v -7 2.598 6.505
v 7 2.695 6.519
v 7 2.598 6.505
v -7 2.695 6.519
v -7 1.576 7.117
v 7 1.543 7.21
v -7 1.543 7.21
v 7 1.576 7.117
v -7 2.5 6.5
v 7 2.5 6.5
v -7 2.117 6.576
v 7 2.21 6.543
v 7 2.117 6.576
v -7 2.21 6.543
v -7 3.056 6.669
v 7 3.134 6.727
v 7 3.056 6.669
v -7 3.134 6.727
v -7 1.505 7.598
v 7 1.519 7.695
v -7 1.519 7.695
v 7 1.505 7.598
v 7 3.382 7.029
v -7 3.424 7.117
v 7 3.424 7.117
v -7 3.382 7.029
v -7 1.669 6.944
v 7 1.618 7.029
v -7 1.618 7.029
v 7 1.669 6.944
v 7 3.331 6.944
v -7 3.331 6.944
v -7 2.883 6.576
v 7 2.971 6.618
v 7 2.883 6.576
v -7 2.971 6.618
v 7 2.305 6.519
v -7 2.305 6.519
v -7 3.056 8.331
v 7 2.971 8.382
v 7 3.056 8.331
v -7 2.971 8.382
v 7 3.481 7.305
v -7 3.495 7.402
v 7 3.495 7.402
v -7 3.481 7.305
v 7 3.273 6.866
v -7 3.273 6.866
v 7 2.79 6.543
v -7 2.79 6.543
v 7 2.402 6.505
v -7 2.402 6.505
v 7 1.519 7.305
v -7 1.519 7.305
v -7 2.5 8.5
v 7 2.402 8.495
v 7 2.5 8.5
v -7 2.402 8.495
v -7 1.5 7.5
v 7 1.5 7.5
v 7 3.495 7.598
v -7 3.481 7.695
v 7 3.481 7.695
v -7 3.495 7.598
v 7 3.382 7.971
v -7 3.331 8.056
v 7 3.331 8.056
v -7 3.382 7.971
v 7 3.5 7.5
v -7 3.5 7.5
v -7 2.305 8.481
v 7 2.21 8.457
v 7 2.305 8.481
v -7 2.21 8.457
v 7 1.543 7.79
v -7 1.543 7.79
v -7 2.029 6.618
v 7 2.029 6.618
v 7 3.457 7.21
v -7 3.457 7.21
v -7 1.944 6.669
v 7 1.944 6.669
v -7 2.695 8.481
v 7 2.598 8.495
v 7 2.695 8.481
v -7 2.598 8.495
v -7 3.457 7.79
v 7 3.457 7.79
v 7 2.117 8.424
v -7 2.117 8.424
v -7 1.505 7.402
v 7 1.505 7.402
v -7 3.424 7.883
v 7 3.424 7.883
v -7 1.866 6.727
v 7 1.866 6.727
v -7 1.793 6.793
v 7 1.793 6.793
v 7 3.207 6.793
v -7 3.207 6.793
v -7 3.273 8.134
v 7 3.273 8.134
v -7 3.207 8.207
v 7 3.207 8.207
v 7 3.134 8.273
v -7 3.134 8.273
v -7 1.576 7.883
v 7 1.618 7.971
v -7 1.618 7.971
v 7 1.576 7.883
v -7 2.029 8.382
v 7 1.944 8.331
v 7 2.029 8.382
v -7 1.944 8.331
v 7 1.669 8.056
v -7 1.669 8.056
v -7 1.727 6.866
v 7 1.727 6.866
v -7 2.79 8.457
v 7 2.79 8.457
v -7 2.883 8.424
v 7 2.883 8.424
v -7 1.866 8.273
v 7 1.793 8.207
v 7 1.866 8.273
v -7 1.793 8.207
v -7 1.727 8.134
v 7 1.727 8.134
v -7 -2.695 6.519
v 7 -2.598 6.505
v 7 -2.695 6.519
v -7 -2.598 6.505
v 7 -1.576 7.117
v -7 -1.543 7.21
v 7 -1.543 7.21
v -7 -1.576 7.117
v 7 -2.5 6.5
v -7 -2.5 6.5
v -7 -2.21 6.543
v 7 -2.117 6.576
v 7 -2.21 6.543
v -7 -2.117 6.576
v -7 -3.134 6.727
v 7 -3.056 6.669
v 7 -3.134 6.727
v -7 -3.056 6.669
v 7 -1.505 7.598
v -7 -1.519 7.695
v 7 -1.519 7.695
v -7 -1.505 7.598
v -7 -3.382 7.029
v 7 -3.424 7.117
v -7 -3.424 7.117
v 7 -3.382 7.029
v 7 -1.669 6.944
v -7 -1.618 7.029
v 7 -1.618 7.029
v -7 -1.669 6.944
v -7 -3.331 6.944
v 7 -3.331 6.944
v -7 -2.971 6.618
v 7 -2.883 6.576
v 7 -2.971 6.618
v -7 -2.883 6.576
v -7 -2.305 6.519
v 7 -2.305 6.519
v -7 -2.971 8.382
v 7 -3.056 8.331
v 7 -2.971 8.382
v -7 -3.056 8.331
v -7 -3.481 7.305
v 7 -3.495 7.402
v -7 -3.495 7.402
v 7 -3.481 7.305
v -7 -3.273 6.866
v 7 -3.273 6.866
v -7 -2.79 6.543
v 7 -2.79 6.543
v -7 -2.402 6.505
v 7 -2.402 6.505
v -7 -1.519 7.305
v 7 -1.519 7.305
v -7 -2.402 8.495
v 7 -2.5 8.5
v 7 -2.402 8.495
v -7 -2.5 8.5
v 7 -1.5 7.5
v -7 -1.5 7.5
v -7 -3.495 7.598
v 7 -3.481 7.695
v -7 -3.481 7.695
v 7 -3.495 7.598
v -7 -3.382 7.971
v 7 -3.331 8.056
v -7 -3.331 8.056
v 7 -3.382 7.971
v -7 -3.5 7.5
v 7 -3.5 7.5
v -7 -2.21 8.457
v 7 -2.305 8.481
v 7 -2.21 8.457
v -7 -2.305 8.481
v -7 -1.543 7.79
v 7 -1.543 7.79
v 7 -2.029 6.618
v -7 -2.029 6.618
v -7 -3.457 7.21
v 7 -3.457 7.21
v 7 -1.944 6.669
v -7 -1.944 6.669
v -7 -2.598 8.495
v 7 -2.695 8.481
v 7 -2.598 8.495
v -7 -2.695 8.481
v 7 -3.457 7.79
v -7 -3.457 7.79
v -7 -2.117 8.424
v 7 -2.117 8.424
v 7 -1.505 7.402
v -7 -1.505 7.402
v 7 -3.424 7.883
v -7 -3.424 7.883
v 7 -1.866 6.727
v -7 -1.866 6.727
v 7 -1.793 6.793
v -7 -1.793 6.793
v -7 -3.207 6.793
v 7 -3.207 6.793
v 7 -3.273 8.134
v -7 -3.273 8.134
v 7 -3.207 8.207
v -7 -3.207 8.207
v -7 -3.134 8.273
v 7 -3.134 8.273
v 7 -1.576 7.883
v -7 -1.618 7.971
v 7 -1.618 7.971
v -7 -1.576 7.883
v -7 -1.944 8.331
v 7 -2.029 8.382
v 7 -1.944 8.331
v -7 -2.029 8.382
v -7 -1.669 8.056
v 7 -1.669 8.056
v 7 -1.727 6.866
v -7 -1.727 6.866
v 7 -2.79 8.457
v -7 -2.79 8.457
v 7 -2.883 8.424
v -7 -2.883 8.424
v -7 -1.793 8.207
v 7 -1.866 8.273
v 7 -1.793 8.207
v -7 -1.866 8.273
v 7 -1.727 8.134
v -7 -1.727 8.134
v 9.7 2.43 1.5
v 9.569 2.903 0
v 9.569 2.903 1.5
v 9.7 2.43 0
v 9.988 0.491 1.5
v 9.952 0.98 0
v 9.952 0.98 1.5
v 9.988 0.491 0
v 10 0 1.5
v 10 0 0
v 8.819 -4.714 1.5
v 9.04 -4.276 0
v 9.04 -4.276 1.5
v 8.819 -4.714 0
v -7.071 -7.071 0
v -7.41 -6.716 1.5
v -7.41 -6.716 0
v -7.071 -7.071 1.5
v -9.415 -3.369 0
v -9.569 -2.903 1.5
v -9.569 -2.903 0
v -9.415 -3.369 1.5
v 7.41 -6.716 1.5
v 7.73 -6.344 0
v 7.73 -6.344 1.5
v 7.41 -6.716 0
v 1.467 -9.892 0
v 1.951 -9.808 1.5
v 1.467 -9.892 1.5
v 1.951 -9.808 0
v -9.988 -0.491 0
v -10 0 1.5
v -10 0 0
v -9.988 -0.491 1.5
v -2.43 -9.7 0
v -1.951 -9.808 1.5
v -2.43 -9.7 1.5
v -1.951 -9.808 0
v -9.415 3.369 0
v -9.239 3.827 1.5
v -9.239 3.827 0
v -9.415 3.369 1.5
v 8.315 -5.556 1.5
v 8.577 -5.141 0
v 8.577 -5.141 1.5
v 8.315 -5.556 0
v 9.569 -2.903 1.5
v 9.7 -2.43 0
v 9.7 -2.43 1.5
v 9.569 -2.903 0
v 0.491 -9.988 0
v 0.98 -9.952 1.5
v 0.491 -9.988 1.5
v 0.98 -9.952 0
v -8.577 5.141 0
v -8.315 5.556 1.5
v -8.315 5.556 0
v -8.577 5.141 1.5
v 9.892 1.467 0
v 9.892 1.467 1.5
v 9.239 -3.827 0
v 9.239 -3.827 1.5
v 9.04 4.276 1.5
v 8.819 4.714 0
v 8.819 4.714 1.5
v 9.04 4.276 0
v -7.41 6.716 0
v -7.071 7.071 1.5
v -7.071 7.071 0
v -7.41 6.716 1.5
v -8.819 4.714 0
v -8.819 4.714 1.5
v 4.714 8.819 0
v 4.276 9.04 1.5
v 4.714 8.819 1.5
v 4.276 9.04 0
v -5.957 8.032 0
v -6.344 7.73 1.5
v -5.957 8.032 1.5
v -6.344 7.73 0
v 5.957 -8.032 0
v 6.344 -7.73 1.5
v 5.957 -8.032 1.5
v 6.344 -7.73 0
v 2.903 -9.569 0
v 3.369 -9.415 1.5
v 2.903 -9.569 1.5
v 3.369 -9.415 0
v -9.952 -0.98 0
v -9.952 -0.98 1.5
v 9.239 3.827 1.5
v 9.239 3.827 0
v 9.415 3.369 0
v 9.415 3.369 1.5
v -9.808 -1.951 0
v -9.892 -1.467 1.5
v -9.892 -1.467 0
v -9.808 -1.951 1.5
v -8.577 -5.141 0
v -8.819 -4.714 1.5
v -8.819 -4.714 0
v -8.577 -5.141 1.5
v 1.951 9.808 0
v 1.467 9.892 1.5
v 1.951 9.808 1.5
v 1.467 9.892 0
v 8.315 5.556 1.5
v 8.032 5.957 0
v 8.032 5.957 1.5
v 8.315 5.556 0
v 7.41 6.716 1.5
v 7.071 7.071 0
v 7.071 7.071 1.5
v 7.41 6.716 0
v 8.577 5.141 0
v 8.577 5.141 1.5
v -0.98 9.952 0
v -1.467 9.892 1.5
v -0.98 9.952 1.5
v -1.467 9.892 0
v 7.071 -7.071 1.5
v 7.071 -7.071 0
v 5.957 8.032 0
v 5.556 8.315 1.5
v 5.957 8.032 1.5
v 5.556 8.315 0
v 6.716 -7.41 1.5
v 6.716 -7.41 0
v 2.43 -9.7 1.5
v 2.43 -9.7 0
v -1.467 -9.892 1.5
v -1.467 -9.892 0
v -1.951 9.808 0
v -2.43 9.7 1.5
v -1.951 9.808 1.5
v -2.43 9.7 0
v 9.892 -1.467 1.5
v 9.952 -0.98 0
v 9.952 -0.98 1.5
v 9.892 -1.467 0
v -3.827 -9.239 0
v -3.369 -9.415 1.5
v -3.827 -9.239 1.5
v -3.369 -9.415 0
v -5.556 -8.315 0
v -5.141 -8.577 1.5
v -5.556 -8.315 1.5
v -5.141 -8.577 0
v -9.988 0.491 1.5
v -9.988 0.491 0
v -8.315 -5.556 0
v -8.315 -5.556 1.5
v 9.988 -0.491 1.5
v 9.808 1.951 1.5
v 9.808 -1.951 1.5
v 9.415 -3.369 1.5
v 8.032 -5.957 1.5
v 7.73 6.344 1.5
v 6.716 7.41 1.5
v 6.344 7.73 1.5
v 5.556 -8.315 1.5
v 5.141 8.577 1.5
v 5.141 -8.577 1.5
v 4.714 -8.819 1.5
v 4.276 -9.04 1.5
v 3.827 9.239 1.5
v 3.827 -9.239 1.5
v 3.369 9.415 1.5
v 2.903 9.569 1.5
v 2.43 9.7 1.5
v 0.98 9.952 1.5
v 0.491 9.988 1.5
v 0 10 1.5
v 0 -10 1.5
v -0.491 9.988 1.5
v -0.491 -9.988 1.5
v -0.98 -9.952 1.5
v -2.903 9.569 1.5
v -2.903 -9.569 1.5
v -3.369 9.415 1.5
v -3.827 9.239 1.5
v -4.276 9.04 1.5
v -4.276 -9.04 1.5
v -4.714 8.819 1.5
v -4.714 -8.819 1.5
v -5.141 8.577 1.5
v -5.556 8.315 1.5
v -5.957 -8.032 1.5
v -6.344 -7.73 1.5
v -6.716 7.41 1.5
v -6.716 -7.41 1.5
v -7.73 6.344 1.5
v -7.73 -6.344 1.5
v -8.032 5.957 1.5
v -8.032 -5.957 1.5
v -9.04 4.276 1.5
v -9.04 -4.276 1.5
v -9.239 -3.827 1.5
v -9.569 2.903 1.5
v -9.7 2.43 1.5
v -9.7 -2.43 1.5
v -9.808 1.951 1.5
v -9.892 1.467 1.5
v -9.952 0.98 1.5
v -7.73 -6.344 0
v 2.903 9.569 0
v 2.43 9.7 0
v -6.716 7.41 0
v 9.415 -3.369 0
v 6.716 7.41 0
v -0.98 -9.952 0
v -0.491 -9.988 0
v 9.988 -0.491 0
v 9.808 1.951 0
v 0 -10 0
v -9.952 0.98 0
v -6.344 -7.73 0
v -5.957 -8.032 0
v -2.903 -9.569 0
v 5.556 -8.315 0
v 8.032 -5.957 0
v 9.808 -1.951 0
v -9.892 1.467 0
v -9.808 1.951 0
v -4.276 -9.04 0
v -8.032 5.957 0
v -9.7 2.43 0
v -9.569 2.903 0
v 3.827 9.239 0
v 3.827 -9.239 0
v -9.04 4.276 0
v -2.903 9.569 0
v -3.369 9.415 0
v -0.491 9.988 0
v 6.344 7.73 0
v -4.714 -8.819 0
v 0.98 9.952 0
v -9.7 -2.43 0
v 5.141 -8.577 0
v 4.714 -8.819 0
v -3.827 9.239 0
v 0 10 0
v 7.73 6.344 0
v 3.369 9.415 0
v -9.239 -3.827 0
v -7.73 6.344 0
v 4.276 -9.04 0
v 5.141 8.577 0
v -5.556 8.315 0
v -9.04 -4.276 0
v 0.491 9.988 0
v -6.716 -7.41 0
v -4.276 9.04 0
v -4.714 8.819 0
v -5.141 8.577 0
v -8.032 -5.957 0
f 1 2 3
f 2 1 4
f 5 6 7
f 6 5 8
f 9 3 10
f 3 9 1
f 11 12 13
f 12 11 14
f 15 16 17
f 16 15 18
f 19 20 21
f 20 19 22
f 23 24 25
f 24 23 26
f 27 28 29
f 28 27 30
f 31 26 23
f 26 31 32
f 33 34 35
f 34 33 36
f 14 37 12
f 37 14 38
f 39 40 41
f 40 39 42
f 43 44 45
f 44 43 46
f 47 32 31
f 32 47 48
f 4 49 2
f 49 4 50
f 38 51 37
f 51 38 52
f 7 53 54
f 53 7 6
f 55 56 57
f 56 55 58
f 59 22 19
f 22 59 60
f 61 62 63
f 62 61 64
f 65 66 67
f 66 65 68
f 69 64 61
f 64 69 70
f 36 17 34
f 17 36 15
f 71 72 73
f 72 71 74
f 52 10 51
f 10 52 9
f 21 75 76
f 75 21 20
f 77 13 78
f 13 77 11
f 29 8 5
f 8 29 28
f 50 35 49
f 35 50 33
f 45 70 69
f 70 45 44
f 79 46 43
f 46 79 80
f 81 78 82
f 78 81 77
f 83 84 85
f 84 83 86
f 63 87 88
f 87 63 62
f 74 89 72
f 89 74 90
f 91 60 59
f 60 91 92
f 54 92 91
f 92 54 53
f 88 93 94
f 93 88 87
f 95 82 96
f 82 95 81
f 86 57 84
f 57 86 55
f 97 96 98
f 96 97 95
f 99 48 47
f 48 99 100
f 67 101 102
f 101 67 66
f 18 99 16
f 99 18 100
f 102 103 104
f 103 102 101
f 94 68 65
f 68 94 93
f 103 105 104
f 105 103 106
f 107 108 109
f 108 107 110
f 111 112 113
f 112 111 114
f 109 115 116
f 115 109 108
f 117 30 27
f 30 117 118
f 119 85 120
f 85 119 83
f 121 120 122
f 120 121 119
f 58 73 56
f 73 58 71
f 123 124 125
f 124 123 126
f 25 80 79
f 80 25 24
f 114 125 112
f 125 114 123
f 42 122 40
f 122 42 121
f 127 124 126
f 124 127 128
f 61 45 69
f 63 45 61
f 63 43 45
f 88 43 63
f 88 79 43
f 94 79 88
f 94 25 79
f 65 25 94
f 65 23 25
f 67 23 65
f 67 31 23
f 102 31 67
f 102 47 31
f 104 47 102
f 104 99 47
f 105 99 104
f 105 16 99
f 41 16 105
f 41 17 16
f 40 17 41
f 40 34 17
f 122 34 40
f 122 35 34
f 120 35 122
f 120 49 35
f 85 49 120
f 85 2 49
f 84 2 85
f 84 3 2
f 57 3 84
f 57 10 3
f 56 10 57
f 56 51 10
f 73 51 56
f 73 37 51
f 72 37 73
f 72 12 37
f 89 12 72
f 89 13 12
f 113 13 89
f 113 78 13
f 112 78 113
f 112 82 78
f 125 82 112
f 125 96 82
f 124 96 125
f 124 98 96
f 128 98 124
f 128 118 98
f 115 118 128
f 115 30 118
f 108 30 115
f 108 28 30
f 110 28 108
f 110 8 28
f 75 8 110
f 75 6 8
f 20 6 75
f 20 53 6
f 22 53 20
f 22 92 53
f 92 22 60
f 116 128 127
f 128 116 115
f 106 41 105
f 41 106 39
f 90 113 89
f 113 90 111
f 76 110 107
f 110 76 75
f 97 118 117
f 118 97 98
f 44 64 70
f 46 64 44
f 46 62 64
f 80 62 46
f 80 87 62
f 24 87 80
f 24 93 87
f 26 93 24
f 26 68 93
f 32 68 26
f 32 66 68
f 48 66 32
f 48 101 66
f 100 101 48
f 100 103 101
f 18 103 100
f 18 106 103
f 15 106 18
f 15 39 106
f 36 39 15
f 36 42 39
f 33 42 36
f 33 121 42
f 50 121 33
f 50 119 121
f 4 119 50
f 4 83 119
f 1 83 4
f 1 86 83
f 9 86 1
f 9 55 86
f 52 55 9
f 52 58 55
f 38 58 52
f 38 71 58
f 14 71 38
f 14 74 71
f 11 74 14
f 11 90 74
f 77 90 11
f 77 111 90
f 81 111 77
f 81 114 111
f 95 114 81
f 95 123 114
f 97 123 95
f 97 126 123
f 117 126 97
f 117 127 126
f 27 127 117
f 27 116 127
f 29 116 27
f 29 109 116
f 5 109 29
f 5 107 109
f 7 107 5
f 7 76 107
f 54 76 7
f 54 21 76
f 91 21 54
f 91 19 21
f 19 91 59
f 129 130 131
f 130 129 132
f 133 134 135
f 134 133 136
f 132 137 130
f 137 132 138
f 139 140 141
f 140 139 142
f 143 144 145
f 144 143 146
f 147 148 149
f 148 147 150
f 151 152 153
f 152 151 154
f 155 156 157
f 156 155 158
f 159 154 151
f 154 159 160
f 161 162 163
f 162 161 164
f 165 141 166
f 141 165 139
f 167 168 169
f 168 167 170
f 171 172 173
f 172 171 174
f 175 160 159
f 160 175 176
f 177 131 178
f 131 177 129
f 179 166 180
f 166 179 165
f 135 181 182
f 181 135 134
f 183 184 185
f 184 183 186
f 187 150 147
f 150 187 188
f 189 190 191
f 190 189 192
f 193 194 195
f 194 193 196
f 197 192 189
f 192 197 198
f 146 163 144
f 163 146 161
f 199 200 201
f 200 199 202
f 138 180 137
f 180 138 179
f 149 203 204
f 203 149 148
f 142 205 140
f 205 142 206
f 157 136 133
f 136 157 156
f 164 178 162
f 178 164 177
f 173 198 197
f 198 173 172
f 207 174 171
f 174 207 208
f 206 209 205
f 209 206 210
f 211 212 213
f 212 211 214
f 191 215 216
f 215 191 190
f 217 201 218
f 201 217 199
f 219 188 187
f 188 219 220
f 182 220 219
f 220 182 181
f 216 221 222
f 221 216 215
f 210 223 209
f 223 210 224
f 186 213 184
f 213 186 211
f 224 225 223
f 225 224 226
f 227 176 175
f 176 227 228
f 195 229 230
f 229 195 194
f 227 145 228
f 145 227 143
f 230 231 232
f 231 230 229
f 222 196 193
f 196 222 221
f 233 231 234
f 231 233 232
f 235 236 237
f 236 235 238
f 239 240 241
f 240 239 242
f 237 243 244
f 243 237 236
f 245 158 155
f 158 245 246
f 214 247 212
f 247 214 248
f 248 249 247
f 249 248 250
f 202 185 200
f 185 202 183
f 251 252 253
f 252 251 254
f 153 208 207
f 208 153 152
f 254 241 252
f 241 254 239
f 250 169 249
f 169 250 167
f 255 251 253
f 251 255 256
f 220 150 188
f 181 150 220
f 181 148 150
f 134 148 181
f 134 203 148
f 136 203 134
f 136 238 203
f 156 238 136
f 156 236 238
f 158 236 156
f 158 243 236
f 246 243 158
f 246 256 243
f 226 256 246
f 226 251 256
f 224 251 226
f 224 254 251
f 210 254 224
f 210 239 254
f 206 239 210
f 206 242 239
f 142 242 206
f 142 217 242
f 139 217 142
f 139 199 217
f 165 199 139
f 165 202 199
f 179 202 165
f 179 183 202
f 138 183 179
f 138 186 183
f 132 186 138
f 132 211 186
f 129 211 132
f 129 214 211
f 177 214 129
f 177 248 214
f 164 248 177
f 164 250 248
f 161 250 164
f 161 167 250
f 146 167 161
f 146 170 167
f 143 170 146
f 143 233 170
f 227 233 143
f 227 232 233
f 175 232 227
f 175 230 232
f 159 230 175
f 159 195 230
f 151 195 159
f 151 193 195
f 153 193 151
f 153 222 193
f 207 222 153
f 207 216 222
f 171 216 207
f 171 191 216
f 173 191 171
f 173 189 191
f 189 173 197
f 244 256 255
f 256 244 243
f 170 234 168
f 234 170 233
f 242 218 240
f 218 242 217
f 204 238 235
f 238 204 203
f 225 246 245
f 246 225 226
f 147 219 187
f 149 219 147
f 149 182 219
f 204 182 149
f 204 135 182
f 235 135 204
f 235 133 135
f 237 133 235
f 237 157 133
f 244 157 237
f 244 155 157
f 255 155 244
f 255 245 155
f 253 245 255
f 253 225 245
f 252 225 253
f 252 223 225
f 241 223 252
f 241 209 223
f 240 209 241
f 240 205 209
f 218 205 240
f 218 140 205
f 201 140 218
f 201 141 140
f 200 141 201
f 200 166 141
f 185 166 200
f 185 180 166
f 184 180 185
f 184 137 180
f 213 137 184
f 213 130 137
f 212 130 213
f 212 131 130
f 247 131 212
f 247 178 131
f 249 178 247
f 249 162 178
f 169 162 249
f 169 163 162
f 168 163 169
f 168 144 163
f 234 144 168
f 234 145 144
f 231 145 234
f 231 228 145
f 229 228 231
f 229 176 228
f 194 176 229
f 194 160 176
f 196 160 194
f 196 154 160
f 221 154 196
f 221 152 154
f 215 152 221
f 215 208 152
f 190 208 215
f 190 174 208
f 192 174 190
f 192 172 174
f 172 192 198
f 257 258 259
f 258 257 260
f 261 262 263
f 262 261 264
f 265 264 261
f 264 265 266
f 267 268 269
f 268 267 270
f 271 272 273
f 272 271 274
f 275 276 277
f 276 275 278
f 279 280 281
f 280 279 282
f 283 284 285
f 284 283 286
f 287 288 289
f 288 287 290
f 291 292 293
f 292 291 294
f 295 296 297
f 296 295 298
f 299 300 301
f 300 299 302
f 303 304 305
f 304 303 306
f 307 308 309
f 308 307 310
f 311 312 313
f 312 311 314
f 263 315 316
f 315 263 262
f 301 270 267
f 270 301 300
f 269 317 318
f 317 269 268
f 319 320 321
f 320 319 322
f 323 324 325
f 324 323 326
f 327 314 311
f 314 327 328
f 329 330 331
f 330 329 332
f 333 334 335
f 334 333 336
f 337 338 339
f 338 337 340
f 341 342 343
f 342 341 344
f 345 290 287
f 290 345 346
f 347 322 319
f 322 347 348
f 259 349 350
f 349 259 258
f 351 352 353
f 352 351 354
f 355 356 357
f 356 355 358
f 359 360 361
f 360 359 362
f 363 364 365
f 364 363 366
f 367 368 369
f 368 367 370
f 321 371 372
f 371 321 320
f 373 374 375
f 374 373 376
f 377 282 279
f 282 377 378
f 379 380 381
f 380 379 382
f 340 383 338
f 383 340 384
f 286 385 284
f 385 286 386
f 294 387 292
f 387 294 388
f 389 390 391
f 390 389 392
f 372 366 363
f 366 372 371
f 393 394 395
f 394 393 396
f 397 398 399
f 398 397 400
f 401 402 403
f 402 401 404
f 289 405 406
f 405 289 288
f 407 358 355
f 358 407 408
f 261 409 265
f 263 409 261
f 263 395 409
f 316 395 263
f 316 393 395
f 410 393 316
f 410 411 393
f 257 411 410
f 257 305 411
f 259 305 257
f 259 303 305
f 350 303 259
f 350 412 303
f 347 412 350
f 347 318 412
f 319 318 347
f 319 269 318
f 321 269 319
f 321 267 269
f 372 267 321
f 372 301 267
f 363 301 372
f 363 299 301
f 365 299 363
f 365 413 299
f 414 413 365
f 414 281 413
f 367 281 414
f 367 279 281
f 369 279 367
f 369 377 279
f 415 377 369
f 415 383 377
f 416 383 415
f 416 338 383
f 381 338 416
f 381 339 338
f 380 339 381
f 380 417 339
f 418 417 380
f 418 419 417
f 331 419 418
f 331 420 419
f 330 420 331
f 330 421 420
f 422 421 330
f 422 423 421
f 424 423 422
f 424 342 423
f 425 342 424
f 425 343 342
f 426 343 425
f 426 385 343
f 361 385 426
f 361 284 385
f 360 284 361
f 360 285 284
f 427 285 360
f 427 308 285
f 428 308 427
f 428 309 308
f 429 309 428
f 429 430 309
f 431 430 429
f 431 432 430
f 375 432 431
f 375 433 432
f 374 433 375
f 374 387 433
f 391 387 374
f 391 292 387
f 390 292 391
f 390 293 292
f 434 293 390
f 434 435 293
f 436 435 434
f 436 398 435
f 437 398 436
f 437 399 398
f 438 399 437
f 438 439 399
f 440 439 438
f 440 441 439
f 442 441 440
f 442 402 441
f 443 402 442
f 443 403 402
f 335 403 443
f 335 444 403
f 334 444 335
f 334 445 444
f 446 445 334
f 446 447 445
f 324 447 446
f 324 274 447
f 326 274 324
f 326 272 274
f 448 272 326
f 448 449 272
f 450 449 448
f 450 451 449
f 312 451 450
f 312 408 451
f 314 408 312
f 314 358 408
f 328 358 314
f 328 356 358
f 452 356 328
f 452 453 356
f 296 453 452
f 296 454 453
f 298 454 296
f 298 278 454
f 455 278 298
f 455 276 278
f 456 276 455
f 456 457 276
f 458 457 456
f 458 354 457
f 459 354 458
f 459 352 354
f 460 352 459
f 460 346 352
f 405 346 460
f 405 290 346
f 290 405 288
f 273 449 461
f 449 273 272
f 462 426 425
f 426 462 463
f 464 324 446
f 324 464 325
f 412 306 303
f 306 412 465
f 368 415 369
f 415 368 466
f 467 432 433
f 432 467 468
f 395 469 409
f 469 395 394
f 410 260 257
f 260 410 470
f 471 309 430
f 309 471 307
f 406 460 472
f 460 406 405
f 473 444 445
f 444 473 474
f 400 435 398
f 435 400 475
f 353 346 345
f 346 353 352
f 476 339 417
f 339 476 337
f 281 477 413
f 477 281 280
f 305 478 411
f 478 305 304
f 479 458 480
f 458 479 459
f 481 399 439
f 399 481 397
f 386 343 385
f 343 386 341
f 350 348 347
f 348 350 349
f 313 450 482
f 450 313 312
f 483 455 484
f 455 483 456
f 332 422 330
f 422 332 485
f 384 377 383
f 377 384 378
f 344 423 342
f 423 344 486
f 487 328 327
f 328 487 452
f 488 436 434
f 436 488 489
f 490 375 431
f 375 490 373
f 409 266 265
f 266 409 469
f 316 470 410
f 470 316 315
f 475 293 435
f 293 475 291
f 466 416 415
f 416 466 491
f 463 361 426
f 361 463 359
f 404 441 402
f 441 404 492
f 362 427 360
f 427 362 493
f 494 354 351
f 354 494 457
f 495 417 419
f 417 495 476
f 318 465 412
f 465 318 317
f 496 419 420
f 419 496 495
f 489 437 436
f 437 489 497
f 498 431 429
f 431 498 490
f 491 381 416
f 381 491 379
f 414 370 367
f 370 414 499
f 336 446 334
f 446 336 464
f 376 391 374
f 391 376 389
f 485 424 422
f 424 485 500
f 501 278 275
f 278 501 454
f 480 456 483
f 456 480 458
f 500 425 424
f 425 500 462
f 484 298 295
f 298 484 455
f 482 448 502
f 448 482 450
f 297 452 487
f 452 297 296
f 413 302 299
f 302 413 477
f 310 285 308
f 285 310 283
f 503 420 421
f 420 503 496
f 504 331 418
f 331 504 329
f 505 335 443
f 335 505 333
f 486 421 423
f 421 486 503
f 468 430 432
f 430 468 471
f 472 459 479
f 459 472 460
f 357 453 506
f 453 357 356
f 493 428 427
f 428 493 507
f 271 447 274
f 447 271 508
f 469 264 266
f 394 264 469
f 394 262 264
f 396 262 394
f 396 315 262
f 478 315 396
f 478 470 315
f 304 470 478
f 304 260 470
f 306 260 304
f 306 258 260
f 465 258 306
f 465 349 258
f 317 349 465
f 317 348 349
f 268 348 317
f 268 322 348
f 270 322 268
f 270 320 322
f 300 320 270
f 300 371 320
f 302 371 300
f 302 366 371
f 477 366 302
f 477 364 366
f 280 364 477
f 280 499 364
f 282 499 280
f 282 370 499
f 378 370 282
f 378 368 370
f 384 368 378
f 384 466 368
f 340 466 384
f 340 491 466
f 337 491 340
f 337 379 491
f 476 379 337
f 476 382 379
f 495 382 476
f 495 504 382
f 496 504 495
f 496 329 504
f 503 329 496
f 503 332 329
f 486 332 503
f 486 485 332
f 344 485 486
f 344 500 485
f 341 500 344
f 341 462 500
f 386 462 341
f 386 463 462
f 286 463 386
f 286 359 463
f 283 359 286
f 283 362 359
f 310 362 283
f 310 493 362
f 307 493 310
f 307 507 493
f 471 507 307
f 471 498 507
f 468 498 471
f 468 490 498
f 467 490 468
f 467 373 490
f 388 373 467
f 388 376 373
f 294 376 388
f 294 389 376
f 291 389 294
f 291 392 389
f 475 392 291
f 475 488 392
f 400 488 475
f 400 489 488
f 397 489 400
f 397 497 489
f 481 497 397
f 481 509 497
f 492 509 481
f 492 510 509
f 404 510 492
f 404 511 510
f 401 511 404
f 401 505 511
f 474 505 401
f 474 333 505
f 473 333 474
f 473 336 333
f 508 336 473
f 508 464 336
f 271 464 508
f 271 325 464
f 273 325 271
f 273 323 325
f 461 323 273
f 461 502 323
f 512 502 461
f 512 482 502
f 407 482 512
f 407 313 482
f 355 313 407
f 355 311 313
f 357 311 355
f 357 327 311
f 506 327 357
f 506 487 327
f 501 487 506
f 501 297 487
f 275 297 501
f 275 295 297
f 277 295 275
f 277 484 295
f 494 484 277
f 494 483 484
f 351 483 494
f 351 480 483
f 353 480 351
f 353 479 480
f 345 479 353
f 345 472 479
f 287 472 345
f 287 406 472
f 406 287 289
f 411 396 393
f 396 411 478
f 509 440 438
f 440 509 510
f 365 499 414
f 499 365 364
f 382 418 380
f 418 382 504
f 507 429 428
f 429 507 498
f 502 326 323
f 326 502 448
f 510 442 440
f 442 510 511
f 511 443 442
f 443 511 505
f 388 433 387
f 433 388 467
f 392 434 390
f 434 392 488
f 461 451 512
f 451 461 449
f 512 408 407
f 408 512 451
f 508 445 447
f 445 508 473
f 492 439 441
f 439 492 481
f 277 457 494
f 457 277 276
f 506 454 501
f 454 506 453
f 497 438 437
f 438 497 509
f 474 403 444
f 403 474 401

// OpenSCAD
// preview[view:south, tilt:top]

// The height of the base plate on which the figure is standing in mm
BASE_HEIGHT = 1.5;

// The diameter of the base plate in mm
BASE_DIAMETER = 20; 

// The percentage that the holder itself shall have in comparison to the base
HOLDER_BASE_RATIO = 60; // [1:100]

// The total height of the holder part in mm
HOLDER_HEIGHT = 7;

// The thickness of the cardboard of which the figure is made in mm
CARDBOARD_STRENGTH = 3;

// Include an additional small nose will be printed on the inside to hold the figure at the bottom
NOSE = 1; // [0: Leave away, 1: include]

// Indicates whether the holder brackets should be tilted or straight
TILT = 1; // [0: No tilting, 1: with tilting]

// Add a small gap between the nose and the base to keep the structure a little more flexible.
NOSE_GAP = 1; // [0: No gap, 1: Print gap]

/* [Hidden] */
cylinderRadius = 1;
noseHeight = 1;
noseWidth = 1;
noseGap = 0.5 * NOSE_GAP;    // Experimental: Should be printable without support...
holderThickness = 1.5;
    
union (){
    offset = CARDBOARD_STRENGTH/2+cylinderRadius;
    base();
    translate ([0, offset, BASE_HEIGHT])
    holder();

    translate ([0,-offset, BASE_HEIGHT])
    rotate([0,0,180])
    holder();
}

module base() 
{
    cylinder (d=BASE_DIAMETER, h=BASE_HEIGHT, $fn=128);
}

module holder()
{
    cubeBase = BASE_DIAMETER * HOLDER_BASE_RATIO/100;
    baseOverlap = BASE_HEIGHT/2;
    
    if (TILT)
        tiltedHolder (cubeBase, baseOverlap);
    else 
        untiltedHolder(cubeBase, baseOverlap);
}

module tiltedHolder (cubeBase, baseOverlap) {
    bendHeight = 1;
    totalHeight = HOLDER_HEIGHT-cylinderRadius/2;    
    
    translate ([-cubeBase/2,-holderThickness/2,0])
        union() {
            translate ([-1,holderThickness/2,HOLDER_HEIGHT-1])
                rotate ([0,90,0])
                    cylinder(r=cylinderRadius, h=cubeBase+2, $fn=64);

    polyhedron(
        points=[[0,holderThickness+noseHeight,-baseOverlap], // 0
                [0,noseHeight,-baseOverlap],  // 1
                [cubeBase,noseHeight,-baseOverlap],    // 2
                [cubeBase,holderThickness+noseHeight,-baseOverlap], // 3
    
                [0,holderThickness+noseHeight,bendHeight],   // 4
                [0,noseHeight,bendHeight],    // 5
                [cubeBase,noseHeight,bendHeight],  // 6
                [cubeBase,holderThickness+noseHeight,bendHeight], // 7
                [0,holderThickness,totalHeight],  // 8
                [0,0,totalHeight], // 9
                [cubeBase,0,totalHeight],   // 10
                [cubeBase,holderThickness,totalHeight],    // 11
    
                // Nose-points
                [cubeBase/2-noseWidth/2, noseHeight, noseGap],          // 12
                [cubeBase/2-noseWidth/2, 0, noseGap],   // 13
                [cubeBase/2+noseWidth/2, 0, noseGap],   // 14
                [cubeBase/2+noseWidth/2,noseHeight, noseGap],          // 15
                [cubeBase/2-noseWidth/2, noseHeight, bendHeight],           // 16
                [cubeBase/2+noseWidth/2, noseHeight, bendHeight],           // 17
                [cubeBase/2-noseWidth/2, 0, totalHeight],    // 18
                [cubeBase/2+noseWidth/2, 0, totalHeight],    // 19
                ], 
        faces = (NOSE) ? getFacesForTiltedNose(): getFacesWithoutTiltedNose()        
    );}
}

function getFacesForTiltedNose() = 
     [[0,3,2,1],   // Bottom
    [0,1,5,4],      // Left bottom
    [4,5,9,8],      // Left top
    [1,12,16,18,9,5],
    [1,2,15,12],
    [2,6,10,19,17,15],
    [12,13,18,16],
    [15,17,19,14],
    [15,14,13,12],
    [13,14,19,18],
    [8,9,18,19,10,11],    // Top
    [2,3,7,6],      // Right Bottom
    [6,7,11,10],    // Right top
    [3,0,4,7],      // Back bottom
    [7,4,8,11],      // Back top
    [5,6,10,9],     // Front top
    ];

function getFacesWithoutTiltedNose() =
    [[0,3,2,1],   // Bottom
    [0,1,5,4],      // Left bottom
    [4,5,9,8],      // Left top
    [1,2,6,5],      // Front bottom
    [5,6,10,9],     // Front top
    [8,9,10,11],    // Top
    [2,3,7,6],      // Right Bottom
    [6,7,11,10],    // Right top
    [3,0,4,7],      // Back bottom
    [7,4,8,11]      // Back top
    ];

module untiltedHolder(cubeBase, baseOverlap){
    translate ([-cubeBase/2,-holderThickness/2,0])
        union() {
            translate ([-1,holderThickness/2,HOLDER_HEIGHT-1])
                rotate ([0,90,0])
                    cylinder(r=cylinderRadius, h=cubeBase+2, $fn=64);
            if (NOSE) {
                translate([0.5+cubeBase/2,0.5,HOLDER_HEIGHT-1])
                    rotate([90,180,0])
                        prism(noseWidth, HOLDER_HEIGHT-1, noseHeight, 0.5);
            }
            translate([0,0,-baseOverlap])
                cube ([BASE_DIAMETER * HOLDER_BASE_RATIO/100, holderThickness, HOLDER_HEIGHT - 1 + baseOverlap]);
        }
}

 module prism(x, y, z, base) {
     polyhedron(
        points=[[0,0,base], [x,0,base], [x,y,z+base], [0,y,z+base], [0,0,0], [x,0,0], [x,y,0], [0,y,0]],
        faces=[[2,6,7,3], [0,1,2,3], [0,3,7,4], [2,1,5,6], [0,4,5,1], [5,4,7,6]]
     );
 } 
 
